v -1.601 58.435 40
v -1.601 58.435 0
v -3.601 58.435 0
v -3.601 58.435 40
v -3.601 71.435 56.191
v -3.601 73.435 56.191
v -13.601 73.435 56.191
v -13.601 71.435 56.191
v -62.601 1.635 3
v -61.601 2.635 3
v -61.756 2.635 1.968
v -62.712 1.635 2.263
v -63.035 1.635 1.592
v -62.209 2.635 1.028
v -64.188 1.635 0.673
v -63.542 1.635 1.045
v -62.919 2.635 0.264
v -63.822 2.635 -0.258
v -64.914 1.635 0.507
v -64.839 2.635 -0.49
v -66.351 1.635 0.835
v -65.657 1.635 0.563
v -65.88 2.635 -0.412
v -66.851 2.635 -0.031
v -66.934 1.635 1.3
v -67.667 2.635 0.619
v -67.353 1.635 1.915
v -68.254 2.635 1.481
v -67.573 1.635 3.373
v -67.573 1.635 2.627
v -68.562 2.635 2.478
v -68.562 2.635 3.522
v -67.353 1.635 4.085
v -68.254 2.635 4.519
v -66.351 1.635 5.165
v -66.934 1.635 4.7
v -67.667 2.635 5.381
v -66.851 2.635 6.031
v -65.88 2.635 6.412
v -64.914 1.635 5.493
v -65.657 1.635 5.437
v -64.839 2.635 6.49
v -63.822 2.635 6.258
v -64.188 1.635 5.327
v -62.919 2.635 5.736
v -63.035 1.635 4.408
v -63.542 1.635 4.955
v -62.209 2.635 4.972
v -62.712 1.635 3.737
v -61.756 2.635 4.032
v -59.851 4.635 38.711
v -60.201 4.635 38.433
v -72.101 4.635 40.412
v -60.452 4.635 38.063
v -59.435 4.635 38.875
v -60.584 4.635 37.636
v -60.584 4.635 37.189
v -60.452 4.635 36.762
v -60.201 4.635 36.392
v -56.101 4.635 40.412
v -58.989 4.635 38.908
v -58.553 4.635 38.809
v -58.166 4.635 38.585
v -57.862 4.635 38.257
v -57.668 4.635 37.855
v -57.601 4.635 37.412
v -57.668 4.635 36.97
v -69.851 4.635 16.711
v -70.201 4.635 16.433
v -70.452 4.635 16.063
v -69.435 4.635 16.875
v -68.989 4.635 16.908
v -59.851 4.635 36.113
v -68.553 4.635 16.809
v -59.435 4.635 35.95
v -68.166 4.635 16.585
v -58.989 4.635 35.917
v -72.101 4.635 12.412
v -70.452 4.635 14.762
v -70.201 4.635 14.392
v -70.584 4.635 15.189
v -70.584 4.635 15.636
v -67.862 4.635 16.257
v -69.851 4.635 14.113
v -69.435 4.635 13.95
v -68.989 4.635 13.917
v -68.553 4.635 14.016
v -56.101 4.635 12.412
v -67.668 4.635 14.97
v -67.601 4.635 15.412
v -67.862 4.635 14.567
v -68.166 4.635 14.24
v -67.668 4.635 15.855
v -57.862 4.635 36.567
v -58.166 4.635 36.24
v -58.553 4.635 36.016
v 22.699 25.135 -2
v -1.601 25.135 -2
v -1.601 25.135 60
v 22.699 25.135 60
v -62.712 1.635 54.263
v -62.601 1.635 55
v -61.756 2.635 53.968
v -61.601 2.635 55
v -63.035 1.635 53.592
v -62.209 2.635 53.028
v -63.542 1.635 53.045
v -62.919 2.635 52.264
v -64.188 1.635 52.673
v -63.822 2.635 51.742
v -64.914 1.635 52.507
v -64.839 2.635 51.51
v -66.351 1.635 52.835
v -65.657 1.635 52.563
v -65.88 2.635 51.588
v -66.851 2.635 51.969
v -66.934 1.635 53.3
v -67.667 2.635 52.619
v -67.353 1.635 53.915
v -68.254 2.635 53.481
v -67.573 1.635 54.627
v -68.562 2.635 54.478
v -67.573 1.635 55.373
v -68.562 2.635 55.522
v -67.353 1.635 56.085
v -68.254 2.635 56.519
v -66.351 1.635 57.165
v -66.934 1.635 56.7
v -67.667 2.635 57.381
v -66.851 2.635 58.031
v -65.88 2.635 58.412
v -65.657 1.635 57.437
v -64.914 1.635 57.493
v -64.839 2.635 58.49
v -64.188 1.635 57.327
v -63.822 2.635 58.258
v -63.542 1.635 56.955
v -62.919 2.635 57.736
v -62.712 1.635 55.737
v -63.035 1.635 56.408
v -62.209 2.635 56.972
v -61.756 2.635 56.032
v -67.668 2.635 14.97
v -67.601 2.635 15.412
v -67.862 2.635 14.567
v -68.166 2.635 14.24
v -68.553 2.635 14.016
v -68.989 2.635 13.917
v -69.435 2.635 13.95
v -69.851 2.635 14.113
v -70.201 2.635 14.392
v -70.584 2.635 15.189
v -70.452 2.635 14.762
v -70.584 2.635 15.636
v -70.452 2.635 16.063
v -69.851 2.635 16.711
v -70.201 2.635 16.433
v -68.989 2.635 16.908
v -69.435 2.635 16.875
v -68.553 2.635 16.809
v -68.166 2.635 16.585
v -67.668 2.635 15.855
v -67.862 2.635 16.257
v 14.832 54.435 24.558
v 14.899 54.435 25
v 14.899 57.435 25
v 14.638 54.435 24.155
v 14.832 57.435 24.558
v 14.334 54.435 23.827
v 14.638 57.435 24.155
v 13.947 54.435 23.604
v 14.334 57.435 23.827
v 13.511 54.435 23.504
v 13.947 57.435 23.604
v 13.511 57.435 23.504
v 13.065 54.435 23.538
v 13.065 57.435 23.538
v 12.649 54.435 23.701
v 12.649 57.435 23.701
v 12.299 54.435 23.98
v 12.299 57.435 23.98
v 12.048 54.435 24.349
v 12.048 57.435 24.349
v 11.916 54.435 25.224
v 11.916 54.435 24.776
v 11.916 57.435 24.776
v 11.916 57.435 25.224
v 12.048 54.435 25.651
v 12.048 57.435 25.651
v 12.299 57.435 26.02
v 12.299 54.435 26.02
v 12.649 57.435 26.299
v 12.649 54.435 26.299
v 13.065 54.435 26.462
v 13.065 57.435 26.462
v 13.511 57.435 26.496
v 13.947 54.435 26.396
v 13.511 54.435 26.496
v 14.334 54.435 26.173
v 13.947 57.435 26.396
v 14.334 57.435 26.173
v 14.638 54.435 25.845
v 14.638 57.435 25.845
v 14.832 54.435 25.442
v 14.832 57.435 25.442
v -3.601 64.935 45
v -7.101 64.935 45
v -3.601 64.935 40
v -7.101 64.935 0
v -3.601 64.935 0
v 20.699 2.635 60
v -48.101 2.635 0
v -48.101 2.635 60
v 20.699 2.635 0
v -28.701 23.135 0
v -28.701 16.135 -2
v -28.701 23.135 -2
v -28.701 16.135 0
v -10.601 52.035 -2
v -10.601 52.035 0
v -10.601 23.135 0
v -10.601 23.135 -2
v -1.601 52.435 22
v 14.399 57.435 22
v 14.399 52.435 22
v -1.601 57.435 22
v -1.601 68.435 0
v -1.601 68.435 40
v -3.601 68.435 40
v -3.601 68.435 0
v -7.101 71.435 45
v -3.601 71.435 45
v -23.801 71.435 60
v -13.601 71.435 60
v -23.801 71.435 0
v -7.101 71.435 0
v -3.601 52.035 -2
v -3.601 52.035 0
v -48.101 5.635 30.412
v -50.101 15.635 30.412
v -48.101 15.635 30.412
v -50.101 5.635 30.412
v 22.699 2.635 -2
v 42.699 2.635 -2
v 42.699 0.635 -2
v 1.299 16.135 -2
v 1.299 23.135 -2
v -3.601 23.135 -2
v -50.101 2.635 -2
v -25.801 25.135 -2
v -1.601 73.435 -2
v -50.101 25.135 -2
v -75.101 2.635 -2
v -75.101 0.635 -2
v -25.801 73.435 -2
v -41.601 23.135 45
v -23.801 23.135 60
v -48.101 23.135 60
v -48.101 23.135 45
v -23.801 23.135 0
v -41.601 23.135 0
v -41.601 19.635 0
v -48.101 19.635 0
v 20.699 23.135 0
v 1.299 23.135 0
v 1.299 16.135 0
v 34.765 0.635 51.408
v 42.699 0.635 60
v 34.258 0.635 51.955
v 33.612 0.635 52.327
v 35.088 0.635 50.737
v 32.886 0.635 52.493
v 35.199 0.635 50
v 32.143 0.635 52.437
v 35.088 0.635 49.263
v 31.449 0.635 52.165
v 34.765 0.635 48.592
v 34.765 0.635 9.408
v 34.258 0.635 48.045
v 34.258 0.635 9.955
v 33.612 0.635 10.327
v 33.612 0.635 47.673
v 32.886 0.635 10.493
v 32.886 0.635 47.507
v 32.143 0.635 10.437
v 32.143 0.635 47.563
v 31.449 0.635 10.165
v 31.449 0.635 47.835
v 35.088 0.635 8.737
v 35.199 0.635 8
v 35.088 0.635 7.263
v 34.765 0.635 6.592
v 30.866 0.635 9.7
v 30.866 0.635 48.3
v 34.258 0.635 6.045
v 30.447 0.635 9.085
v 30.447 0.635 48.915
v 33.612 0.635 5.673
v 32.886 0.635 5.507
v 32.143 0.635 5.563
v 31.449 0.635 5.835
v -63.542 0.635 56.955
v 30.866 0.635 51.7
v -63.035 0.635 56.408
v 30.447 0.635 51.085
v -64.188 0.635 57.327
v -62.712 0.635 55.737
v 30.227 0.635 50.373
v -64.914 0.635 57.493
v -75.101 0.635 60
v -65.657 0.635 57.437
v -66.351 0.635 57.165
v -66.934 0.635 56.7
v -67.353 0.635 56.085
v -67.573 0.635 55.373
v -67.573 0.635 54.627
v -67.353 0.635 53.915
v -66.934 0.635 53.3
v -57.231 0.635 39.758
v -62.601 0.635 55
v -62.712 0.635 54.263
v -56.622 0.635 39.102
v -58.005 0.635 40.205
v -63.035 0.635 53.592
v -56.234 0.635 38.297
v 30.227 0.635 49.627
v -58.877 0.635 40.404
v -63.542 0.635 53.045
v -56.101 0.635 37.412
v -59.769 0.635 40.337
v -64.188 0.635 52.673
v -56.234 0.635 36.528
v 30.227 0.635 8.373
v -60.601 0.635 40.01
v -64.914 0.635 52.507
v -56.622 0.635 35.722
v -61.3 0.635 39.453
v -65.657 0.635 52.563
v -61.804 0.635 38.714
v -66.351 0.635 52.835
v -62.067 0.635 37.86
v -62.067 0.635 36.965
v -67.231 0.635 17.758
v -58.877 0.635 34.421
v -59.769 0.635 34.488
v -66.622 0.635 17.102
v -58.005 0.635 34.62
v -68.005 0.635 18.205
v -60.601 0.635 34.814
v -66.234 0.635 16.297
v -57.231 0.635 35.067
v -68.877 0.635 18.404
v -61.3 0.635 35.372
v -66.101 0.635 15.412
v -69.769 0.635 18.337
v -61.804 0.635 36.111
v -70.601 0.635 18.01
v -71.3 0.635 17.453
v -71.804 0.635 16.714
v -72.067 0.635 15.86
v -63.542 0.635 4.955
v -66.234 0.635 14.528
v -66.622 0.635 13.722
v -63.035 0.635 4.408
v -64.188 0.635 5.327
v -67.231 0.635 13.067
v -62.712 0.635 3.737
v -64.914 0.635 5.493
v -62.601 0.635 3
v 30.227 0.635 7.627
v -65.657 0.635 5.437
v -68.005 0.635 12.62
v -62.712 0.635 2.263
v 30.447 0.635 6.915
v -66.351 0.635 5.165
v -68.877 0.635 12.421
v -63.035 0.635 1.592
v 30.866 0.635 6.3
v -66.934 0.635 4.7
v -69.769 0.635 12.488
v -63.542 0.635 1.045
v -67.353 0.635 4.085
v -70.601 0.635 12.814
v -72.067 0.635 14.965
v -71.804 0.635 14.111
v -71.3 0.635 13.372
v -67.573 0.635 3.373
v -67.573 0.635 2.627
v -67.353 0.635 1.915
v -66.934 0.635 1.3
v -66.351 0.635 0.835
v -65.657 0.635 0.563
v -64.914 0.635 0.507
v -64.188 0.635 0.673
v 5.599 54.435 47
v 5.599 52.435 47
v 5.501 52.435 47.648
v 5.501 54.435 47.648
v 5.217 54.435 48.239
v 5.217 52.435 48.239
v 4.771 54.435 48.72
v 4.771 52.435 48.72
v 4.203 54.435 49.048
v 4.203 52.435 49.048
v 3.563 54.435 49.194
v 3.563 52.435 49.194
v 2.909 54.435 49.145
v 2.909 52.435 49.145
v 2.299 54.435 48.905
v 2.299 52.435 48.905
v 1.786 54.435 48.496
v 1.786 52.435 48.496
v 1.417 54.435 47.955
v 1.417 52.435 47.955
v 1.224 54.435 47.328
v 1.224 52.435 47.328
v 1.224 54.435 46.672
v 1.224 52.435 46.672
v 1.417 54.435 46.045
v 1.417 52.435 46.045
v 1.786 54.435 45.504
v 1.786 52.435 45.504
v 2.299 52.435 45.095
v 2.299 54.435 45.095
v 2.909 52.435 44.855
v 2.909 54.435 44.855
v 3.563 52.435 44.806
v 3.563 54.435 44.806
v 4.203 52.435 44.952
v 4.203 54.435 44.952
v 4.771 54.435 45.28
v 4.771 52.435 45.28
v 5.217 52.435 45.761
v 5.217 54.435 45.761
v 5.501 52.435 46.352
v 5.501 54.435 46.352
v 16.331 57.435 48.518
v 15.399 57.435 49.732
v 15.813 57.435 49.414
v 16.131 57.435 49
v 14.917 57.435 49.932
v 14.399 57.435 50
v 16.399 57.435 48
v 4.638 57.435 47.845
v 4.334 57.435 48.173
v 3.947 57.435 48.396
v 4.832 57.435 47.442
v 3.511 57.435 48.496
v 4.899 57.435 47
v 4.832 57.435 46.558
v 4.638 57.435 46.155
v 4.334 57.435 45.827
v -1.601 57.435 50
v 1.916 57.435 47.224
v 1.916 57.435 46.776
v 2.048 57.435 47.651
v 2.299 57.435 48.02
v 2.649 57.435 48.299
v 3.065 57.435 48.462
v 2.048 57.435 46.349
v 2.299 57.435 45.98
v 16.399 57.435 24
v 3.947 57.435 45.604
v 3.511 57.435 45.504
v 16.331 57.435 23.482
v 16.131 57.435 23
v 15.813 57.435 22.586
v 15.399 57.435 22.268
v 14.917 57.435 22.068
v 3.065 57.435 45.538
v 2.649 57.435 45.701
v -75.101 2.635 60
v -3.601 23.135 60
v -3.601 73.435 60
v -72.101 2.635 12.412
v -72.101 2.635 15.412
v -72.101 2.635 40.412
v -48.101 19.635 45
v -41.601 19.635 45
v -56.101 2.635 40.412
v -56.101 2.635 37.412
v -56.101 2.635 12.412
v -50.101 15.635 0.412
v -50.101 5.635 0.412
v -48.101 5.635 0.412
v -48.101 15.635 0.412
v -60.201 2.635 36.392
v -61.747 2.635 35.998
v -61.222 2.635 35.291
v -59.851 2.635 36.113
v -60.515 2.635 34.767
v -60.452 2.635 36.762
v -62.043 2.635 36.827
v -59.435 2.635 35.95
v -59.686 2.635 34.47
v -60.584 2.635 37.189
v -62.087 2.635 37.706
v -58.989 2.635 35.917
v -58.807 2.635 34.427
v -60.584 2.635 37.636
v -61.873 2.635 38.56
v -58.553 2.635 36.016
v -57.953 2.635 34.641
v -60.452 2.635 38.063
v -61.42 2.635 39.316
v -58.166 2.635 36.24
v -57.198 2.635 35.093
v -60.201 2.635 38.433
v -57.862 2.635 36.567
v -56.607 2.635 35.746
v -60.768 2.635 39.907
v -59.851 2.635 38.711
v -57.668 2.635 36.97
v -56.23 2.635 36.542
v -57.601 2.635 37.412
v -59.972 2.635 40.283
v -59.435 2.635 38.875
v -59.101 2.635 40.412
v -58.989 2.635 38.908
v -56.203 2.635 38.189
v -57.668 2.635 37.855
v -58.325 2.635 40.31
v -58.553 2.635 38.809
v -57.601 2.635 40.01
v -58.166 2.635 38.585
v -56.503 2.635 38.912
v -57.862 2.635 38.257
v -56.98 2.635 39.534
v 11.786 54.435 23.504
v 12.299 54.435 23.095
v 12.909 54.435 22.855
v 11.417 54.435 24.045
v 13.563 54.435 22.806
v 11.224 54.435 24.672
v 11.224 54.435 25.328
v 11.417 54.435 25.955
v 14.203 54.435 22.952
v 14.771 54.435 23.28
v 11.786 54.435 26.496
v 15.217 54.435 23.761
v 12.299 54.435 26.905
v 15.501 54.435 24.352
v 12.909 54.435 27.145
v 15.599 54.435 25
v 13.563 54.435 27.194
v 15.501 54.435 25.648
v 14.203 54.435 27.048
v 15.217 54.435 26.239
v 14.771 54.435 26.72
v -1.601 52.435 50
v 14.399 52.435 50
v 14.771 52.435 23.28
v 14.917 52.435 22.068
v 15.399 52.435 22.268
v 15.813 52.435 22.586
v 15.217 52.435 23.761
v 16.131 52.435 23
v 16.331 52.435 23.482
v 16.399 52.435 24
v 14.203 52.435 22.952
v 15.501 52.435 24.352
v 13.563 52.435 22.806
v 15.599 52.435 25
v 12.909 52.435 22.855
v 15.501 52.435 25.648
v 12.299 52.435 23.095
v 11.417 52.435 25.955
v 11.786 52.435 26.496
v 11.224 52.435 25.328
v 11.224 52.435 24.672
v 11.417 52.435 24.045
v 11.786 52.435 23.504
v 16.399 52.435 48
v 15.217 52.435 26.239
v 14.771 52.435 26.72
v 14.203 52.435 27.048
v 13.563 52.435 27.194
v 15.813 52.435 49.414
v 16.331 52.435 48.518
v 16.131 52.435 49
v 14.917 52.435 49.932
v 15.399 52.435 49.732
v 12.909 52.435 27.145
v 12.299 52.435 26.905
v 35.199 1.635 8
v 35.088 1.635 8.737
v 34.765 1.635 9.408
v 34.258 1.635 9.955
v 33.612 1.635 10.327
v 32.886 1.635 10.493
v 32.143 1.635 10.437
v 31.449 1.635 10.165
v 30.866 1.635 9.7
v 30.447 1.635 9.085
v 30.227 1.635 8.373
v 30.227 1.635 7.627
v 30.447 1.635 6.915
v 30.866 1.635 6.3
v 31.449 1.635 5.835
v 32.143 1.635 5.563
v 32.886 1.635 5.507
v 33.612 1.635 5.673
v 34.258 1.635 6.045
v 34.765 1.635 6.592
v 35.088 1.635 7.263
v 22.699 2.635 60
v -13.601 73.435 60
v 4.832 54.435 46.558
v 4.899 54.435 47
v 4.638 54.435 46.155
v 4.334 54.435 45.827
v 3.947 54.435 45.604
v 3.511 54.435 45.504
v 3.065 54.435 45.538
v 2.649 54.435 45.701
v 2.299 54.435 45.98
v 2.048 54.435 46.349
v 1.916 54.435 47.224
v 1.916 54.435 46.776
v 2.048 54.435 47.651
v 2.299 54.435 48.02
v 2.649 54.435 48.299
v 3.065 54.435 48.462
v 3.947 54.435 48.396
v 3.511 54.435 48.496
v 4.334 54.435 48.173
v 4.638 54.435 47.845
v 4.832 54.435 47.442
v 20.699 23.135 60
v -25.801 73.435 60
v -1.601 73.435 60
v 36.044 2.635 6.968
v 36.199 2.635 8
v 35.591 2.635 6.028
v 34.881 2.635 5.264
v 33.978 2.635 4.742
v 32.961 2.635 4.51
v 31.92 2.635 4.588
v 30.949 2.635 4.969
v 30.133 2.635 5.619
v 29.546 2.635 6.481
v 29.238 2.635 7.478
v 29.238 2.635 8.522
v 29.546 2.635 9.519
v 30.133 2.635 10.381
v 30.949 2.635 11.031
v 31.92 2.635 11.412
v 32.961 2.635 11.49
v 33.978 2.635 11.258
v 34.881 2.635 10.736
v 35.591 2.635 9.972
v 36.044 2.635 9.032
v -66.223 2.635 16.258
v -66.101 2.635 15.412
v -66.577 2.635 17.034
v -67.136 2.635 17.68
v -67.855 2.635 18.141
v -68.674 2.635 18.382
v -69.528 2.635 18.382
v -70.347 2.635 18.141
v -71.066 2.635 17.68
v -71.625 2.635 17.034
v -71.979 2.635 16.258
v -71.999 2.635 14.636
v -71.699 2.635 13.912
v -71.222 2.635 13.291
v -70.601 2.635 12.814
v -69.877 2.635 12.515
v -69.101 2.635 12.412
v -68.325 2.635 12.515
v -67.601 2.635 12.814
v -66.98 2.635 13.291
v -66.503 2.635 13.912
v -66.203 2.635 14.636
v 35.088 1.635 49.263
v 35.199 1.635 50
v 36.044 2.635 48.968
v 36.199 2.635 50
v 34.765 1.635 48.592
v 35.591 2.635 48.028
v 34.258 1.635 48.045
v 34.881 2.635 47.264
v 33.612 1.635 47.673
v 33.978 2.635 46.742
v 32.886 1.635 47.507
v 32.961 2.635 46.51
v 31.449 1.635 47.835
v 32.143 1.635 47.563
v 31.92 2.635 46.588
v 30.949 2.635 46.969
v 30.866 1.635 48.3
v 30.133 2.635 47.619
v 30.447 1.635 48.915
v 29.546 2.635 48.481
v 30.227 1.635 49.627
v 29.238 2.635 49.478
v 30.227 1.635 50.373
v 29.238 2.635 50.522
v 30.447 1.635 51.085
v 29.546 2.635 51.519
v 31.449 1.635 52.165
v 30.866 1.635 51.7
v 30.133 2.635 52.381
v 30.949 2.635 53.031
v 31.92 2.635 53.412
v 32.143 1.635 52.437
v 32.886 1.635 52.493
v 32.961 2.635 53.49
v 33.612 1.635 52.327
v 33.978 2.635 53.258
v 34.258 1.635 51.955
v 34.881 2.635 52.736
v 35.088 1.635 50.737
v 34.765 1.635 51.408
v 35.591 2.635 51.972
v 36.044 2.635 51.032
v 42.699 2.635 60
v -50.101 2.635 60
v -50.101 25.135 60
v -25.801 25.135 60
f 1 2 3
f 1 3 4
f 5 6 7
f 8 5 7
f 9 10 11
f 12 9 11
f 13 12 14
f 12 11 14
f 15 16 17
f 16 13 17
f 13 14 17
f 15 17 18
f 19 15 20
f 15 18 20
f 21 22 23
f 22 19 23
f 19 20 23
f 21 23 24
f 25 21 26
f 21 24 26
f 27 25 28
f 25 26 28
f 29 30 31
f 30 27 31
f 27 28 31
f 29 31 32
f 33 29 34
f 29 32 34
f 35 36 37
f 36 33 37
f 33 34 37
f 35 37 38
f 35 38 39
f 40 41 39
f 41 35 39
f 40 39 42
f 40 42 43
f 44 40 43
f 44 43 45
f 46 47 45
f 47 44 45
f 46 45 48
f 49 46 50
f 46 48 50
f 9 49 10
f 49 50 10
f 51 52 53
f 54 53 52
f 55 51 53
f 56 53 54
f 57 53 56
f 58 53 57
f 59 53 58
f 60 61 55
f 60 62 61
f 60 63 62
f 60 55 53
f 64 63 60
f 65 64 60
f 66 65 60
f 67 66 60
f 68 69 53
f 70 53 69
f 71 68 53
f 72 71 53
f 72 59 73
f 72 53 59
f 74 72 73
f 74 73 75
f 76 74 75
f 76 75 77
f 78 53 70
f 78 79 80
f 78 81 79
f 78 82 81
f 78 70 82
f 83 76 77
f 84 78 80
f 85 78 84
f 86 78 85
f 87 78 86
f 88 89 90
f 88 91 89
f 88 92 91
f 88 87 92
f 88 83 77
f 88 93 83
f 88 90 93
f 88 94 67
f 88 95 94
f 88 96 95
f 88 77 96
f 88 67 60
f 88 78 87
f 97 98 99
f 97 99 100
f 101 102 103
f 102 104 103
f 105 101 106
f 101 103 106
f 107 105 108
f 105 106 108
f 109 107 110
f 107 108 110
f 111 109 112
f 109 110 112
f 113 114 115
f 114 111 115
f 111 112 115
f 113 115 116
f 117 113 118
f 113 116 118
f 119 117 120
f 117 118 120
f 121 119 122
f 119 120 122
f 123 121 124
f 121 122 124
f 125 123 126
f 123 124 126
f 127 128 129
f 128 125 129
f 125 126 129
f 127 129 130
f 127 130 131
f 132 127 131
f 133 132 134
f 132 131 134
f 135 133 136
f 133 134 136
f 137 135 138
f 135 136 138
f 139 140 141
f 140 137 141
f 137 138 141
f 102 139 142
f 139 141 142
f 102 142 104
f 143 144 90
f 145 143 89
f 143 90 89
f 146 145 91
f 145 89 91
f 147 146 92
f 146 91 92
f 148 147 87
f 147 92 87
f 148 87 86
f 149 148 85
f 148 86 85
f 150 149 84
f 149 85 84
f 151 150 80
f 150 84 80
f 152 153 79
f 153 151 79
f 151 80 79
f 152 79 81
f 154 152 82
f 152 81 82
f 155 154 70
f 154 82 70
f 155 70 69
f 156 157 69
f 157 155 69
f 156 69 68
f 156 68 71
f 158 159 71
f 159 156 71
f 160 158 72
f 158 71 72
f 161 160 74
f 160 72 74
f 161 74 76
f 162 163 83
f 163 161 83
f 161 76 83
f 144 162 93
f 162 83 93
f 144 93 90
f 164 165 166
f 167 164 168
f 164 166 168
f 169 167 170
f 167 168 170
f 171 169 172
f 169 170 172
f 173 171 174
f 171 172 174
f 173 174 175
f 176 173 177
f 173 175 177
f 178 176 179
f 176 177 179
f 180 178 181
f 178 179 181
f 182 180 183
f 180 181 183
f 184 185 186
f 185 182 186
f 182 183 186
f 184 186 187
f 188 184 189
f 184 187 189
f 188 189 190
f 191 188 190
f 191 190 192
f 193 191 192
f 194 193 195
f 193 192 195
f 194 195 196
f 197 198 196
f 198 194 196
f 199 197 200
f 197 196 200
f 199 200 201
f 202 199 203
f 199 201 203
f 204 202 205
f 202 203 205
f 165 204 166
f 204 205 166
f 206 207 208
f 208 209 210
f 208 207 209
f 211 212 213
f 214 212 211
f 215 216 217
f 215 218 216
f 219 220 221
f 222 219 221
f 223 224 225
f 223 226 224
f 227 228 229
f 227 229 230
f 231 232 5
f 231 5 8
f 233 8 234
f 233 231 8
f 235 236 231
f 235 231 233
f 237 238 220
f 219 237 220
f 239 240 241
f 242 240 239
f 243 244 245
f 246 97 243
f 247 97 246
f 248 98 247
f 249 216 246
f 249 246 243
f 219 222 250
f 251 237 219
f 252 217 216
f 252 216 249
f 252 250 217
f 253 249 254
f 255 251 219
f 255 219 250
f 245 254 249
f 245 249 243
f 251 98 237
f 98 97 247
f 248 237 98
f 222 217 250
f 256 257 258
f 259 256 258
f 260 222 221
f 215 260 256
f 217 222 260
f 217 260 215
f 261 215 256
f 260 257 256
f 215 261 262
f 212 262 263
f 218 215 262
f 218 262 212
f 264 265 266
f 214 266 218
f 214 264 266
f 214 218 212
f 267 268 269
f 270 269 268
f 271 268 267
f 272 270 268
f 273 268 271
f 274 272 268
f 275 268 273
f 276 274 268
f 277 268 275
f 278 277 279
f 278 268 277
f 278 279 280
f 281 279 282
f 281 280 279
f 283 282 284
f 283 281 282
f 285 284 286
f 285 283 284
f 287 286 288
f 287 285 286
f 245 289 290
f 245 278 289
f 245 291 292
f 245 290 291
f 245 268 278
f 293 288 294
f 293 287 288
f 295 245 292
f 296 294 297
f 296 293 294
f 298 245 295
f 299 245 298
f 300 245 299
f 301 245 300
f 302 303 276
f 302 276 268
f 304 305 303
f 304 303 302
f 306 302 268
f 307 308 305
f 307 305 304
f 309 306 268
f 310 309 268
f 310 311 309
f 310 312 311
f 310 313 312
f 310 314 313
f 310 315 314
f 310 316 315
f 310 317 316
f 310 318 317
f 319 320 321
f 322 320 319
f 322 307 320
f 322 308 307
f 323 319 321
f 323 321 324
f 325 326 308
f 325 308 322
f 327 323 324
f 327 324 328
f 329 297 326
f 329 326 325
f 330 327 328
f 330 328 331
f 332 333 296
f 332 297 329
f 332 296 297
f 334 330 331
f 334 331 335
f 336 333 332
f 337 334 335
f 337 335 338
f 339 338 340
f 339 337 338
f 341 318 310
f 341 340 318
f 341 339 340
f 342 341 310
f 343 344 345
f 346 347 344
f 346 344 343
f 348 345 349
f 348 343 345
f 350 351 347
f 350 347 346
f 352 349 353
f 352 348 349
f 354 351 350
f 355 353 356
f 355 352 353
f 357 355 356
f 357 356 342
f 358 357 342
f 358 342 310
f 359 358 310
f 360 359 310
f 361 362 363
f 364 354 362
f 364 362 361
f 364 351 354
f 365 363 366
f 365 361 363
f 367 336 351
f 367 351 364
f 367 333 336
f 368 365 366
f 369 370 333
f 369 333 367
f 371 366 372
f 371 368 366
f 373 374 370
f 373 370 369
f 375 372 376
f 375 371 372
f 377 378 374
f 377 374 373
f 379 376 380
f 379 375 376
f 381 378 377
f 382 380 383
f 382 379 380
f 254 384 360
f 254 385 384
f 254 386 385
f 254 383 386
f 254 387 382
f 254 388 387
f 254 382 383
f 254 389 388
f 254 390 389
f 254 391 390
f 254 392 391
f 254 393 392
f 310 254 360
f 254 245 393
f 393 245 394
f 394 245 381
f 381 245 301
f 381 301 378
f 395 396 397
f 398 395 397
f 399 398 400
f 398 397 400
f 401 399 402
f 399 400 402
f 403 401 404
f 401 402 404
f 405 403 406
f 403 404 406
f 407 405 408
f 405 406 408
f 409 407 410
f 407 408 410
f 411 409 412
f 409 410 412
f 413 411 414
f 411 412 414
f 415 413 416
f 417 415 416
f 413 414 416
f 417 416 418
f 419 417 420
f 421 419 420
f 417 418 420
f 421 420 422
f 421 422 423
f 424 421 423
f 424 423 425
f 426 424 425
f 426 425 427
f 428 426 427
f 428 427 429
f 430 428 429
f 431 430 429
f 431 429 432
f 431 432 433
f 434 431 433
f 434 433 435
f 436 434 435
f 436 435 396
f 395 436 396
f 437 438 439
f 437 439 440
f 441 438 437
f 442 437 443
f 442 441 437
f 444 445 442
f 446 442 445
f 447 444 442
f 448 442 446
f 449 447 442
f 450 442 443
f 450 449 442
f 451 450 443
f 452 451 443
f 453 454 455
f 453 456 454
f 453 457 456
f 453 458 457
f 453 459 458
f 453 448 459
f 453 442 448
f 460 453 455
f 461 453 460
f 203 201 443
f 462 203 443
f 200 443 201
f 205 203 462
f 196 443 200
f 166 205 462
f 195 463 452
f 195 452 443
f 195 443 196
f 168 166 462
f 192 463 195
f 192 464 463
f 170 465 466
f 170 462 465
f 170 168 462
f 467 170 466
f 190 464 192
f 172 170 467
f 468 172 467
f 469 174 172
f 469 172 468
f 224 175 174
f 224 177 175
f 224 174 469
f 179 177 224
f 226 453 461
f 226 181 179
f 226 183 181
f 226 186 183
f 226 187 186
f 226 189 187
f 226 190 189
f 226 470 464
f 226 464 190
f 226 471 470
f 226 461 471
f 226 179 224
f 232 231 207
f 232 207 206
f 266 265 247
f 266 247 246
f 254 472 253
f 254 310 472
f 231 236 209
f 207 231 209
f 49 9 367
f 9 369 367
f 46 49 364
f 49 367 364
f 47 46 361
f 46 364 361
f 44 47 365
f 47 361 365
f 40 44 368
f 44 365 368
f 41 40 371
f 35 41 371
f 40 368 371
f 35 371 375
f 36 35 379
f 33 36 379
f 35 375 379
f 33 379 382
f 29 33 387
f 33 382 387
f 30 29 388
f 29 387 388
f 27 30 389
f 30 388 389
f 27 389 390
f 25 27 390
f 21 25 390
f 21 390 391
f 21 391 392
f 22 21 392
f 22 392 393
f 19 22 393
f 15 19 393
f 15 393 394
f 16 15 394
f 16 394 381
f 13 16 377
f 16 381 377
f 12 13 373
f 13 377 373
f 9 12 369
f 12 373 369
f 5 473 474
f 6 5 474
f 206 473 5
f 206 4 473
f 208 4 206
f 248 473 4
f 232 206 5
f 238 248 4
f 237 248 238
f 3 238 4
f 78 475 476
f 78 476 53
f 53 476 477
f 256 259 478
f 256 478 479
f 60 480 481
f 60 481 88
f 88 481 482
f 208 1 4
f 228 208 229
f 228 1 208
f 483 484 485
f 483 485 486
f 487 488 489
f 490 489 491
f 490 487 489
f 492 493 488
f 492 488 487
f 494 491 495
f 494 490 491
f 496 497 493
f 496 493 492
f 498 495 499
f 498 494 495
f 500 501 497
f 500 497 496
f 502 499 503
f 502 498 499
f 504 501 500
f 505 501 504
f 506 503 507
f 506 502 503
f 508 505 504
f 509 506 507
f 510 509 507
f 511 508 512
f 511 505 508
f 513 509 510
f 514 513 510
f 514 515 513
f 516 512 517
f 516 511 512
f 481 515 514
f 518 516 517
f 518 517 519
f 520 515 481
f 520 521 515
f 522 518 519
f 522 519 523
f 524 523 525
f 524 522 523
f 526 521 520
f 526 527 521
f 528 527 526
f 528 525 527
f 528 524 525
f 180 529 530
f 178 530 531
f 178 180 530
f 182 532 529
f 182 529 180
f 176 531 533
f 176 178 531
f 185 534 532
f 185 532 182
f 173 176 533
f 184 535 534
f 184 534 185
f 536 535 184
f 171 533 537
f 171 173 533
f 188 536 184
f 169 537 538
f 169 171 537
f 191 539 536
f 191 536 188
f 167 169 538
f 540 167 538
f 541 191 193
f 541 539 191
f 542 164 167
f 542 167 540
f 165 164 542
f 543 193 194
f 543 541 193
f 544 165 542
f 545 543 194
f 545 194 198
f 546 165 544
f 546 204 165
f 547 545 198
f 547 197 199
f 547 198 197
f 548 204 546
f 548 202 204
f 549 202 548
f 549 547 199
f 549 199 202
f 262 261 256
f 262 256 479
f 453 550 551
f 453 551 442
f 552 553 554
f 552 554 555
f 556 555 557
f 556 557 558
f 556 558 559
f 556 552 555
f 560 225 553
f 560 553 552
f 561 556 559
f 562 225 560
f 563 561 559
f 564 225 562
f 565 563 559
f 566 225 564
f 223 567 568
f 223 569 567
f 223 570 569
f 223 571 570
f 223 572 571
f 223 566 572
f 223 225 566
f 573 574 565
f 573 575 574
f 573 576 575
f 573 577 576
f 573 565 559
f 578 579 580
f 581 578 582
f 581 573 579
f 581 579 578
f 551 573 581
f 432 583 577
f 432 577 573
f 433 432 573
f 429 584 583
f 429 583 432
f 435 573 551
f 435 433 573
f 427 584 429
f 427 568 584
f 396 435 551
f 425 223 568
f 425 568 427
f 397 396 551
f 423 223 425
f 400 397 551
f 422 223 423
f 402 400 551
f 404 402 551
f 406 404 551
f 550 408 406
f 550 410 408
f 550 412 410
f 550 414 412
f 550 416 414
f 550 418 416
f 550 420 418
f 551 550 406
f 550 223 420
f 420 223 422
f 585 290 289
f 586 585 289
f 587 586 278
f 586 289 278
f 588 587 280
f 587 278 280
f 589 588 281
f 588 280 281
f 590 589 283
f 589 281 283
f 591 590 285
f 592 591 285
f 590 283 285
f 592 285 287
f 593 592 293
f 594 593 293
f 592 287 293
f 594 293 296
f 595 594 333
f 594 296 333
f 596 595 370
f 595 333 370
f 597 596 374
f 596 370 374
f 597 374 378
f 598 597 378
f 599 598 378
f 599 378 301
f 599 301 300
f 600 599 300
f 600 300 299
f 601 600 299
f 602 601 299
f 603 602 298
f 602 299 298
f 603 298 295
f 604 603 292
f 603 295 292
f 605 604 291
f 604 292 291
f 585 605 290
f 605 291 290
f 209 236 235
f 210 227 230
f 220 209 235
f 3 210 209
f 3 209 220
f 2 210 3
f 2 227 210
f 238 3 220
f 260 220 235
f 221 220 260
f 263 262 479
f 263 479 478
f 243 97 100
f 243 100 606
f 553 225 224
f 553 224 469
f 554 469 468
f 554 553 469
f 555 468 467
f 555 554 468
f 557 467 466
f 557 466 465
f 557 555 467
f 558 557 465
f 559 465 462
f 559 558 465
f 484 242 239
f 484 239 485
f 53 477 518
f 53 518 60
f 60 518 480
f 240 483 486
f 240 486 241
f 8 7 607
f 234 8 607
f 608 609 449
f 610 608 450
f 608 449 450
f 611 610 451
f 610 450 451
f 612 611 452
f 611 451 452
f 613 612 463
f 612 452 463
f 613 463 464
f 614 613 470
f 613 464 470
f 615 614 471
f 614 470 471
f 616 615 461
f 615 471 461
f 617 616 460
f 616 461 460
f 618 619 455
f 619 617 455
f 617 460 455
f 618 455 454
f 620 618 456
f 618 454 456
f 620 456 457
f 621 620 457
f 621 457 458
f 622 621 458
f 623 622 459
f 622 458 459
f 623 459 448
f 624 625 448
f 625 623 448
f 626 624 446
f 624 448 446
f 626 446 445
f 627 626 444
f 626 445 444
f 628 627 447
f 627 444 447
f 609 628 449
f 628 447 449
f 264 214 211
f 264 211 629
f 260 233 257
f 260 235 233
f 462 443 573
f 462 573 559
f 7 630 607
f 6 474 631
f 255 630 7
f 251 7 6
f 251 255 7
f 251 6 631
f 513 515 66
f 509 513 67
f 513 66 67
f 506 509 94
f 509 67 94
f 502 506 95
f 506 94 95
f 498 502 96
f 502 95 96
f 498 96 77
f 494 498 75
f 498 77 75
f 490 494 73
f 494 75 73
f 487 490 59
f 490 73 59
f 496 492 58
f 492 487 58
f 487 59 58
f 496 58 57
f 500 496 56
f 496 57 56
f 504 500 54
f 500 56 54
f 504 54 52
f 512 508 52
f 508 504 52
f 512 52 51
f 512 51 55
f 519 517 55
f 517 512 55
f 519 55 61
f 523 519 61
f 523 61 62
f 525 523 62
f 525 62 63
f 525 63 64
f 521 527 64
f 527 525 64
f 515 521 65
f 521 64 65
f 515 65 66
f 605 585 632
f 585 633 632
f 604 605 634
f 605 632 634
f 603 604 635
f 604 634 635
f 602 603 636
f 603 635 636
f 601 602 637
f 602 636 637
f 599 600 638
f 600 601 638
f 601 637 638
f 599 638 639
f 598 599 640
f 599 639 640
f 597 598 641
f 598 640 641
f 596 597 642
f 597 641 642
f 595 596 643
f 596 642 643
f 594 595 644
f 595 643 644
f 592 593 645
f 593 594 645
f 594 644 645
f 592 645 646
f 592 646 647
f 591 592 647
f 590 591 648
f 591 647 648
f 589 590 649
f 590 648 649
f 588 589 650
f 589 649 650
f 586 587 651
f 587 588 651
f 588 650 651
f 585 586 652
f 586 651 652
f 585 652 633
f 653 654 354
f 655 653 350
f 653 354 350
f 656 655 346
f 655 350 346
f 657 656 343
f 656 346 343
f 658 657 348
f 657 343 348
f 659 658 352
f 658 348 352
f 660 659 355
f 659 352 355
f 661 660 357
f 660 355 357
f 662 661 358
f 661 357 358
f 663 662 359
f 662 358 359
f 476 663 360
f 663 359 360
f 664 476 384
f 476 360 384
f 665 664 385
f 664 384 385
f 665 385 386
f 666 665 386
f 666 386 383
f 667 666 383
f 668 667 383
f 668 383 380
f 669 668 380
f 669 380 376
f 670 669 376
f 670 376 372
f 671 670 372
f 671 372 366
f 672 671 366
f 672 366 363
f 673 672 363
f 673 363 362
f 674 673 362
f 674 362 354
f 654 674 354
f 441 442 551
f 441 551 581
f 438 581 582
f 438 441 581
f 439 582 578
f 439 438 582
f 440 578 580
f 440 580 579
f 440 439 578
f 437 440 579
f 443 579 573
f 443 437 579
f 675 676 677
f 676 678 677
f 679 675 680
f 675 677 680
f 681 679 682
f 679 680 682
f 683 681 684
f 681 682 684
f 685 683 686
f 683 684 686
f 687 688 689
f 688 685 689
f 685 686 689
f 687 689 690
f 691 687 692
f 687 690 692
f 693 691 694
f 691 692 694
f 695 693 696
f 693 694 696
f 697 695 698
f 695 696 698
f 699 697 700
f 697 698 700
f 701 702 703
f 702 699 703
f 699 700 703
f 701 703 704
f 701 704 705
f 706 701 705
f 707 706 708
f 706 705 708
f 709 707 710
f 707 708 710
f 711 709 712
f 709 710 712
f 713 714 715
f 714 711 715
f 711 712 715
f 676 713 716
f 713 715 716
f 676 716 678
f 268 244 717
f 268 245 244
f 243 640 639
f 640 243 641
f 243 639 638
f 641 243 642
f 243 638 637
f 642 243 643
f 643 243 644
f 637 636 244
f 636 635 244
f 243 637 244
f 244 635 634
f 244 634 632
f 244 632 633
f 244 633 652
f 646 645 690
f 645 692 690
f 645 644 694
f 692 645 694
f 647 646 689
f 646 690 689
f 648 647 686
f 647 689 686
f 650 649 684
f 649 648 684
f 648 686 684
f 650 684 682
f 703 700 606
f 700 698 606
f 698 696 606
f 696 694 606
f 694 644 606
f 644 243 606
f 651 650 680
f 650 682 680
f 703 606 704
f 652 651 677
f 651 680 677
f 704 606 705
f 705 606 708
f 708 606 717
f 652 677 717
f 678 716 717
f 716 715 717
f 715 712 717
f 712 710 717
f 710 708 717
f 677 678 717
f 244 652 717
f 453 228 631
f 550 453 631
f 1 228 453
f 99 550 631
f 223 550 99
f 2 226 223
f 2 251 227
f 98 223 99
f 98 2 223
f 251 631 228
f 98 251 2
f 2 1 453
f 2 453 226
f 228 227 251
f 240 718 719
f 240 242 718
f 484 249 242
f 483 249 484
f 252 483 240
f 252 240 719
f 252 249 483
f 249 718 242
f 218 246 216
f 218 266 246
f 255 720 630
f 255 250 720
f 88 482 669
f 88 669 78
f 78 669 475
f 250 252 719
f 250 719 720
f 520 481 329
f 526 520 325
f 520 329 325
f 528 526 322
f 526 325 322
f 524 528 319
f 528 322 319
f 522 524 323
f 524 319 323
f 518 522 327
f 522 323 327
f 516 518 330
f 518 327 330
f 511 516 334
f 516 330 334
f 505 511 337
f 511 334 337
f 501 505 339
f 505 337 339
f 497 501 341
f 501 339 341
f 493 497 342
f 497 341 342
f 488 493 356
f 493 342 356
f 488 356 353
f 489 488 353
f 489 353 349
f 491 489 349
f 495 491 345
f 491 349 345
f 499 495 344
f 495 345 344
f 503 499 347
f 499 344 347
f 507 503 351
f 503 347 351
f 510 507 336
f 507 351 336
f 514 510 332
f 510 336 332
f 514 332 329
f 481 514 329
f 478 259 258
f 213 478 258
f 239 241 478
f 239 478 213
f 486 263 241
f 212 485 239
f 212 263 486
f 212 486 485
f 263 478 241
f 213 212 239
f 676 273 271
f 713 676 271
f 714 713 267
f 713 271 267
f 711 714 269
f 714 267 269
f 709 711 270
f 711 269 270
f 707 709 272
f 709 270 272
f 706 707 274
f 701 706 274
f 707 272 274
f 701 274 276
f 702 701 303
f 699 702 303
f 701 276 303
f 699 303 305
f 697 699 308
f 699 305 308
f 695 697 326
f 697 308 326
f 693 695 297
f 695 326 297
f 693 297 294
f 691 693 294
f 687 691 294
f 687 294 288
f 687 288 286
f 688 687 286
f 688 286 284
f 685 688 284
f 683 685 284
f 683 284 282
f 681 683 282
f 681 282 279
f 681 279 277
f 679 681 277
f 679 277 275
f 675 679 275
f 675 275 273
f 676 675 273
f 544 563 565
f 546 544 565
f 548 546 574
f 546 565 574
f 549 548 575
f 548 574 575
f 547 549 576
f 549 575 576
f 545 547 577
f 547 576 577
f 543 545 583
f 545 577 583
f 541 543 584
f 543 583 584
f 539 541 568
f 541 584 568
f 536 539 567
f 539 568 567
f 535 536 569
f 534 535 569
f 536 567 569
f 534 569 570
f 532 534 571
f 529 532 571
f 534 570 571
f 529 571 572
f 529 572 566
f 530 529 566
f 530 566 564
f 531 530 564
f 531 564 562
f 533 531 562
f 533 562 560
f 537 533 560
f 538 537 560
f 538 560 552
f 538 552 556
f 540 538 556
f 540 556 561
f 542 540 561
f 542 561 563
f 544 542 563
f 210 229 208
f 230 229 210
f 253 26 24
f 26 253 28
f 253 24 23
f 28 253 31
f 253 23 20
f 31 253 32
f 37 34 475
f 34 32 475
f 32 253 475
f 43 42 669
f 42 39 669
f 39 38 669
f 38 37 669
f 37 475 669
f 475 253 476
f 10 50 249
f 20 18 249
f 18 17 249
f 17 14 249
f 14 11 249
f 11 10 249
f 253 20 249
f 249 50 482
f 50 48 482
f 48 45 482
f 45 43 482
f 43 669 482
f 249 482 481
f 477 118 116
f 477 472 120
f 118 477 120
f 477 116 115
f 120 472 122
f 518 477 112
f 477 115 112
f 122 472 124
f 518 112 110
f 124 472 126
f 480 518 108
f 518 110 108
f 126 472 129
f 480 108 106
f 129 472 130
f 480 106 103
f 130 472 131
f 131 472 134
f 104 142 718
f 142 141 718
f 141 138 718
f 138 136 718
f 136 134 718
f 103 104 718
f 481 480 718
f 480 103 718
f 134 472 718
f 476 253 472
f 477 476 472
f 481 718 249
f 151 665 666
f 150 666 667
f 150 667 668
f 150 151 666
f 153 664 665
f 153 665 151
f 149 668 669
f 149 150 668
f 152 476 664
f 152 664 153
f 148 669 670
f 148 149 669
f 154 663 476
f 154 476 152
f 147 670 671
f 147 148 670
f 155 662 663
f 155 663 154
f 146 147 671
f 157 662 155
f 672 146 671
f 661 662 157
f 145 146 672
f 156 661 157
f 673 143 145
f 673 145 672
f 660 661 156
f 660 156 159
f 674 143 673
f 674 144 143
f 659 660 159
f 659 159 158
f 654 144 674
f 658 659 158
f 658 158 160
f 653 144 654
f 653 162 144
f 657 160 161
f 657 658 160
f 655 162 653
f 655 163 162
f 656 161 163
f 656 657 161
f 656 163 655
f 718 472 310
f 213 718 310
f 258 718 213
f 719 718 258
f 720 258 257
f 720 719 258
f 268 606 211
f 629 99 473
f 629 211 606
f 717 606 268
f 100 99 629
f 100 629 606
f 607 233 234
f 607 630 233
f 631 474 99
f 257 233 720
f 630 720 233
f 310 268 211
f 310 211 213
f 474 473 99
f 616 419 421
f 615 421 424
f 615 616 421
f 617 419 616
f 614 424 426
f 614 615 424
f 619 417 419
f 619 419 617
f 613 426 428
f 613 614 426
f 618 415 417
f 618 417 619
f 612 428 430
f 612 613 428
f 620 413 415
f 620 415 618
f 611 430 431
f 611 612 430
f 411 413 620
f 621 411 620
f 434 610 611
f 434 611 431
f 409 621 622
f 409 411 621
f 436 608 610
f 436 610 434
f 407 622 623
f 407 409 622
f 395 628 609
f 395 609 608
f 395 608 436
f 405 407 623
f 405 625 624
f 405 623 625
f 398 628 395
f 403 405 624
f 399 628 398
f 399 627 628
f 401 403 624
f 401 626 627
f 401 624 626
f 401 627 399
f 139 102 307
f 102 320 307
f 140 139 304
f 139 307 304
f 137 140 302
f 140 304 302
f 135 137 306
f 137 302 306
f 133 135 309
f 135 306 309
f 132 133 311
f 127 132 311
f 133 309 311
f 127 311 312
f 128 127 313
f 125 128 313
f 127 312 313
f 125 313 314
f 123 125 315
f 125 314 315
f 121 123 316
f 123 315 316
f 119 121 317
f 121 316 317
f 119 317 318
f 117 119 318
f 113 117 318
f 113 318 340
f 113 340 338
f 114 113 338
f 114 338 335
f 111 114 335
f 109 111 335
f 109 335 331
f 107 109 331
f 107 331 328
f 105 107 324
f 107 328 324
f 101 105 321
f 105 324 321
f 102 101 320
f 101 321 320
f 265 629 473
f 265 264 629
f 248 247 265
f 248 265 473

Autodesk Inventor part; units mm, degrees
ref_plane "YZ Plane" through (0, 0, 0) normal (1, 0, 0) x (0, 1, 0)
ref_plane "XZ Plane" through (0, 0, 0) normal (0, 1, 0) x (-1, 0, 0)
ref_plane "XY Plane" through (0, 0, 0) normal (0, 0, 1) x (1, 0, 0)
sketch "Sketch1" plane through (0, 0, 0) normal (0, 0, 1) x (1, 0, 0)
  line L0 (-50.101, 0.6354) -> (-50.101, 25.1354)
  line L1 (-50.101, 25.1354) -> (-25.801, 25.1354)
  line L2 (-25.801, 25.1354) -> (-25.801, 73.4354)
  line L3 (-25.801, 73.4354) -> (-1.601, 73.4354)
  line L4 (-1.601, 73.4354) -> (-1.601, 25.1354)
  line L5 (-1.601, 25.1354) -> (22.699, 25.1354)
  line L6 (22.699, 25.1354) -> (22.699, 0.6354)
  line L7 (22.699, 0.6354) -> (-50.101, 0.6354)
  line L8 (-23.801, 71.4354) -> (-23.801, 23.1354)
  line L9 (-23.801, 23.1354) -> (-48.101, 23.1354)
  line L10 (-48.101, 23.1354) -> (-48.101, 2.6354)
  line L11 (-48.101, 2.6354) -> (20.699, 2.6354)
  line L12 (20.699, 2.6354) -> (20.699, 23.1354)
  line L13 (20.699, 23.1354) -> (-3.601, 23.1354)
  line L14 (-3.601, 23.1354) -> (-3.601, 71.4354)
  line L15 (-3.601, 71.4354) -> (-23.801, 71.4354)
  line L16 (-13.701, 71.4354) -> (-13.701, 50.8657) construction
  line L17 (-13.701, 2.6354) -> (-13.701, -4.6342) construction
  point P0 (0, 0)
  dimension "d1" = 20.2
  dimension "d2" = 2
  dimension "d3" = 20.5
  dimension "d4" = 68.8
  dimension "d6" = 68.8
extrude "Extrusion1" add sketch "Sketch1" along normal blind 60
sketch "Sketch2" plane through (0, 0, 0) normal (0, 0, -1) x (-1, 0, 0)
  line L0 (1.601, 73.4354) -> (1.601, 25.1354) projected
  line L1 (25.801, 73.4354) -> (1.601, 73.4354) projected
  line L2 (25.801, 25.1354) -> (25.801, 73.4354) projected
  line L3 (50.101, 25.1354) -> (25.801, 25.1354) projected
  line L4 (50.101, 0.6354) -> (50.101, 25.1354) projected
  line L5 (-22.699, 0.6354) -> (50.101, 0.6354) projected
  line L6 (-22.699, 25.1354) -> (-22.699, 0.6354) projected
  line L7 (1.601, 25.1354) -> (-22.699, 25.1354) projected
  point P0 (0, 0)
extrude "Extrusion2" add sketch "Sketch2" along normal blind 2
sketch "Sketch3" plane through (0, 0, 0) normal (0, 0, 1) x (1, 0, 0)
  line L0 (-3.601, 71.4354) -> (-7.101, 71.4354)
  line L1 (-7.101, 71.4354) -> (-7.101, 64.9354)
  line L2 (-7.101, 64.9354) -> (-3.601, 64.9354)
  line L3 (-3.601, 64.9354) -> (-3.601, 71.4354)
  line L4 (-48.101, 23.1354) -> (-41.601, 23.1354)
  line L5 (-41.601, 23.1354) -> (-41.601, 19.6354)
  line L6 (-41.601, 19.6354) -> (-48.101, 19.6354)
  line L7 (-48.101, 19.6354) -> (-48.101, 23.1354)
  point P0 (0, 0)
  dimension "d15" = 3.5
  dimension "d16" = 6.5
  dimension "d157" = 6.5
  dimension "d158" = 3.5
extrude "Extrusion3" add sketch "Sketch3" along normal blind 45
sketch "Sketch8" plane through (-25.801, 73.4354, 60) normal (0, 1, 0) x (1, 0, 0)
  line L0 (22.2, 60) -> (22.2, 0) projected
  line L1 (12.2, -0.1913) -> (22.2, -0.1913)
  line L2 (22.2, -0.1913) -> (22.2, 3.8087)
  line L3 (22.2, 3.8087) -> (12.2, 3.8087)
  line L4 (12.2, 3.8087) -> (12.2, -0.1913)
  point P0 (25.801, 60)
  dimension "d41" = 4
  dimension "d42" = 10
extrude "Extrusion8" cut sketch "Sketch8" against normal blind 2
sketch "Sketch14" plane through (-50.101, 0.6354, 60) normal (0, -1, 0) x (1, 0, 0)
  line L0 (0, 0) -> (-25, 0)
  line L1 (-25, 0) -> (-25, -62)
  line L2 (-25, -62) -> (0, -62)
  line L3 (0, -62) -> (0, 0)
  line L4 (0, -62) -> (0, 0) projected
  line L5 (0, -31) -> (-8.3028, -31) construction
  line L6 (-25, -31) -> (-20.8134, -31) construction
  circle A0 centre (-15, -5) radius 2.5
  line L7 (72.8, -62) -> (92.8, -62)
  line L8 (92.8, -62) -> (92.8, 0)
  line L9 (92.8, 0) -> (72.8, 0)
  line L10 (72.8, 0) -> (72.8, -62)
  line L11 (72.8, 0) -> (48.5, 0) projected
  circle A1 centre (82.8, -10) radius 2.5
  circle A2 centre (-15, -57) radius 2.5
  circle A3 centre (82.8, -52) radius 2.5
  point P0 (50.101, -60)
  dimension "d81" = 62
  dimension "d82" = 25
  dimension "d83" = 5
  dimension "d89" = 5
  dimension "d90" = 10
  dimension "d150" = 5
  dimension "d151" = 10
  dimension "d152" = 10
  dimension "d153" = 20
  dimension "d159" = 5
  dimension "d160" = 5
  dimension "d161" = 5
  dimension "d162" = 10
  dimension "d163" = 10
  dimension "d164" = 10
extrude "Extrusion14" add sketch "Sketch14" against normal blind 2
chamfer "Chamfer1" distance 1 angle 45 4 edges at (-67.601, 2.6354, 55) (-67.601, 2.6354, 3) (30.199, 2.6354, 8) (30.199, 2.6354, 50)
sketch "Sketch15" plane through (-50.101, 2.6354, 60) normal (0, 1, 0) x (1, 0, 0)
  line L0 (-6, 47.5876) -> (-22, 47.5876)
  line L1 (-22, 47.5876) -> (-22, 19.5876)
  line L2 (-22, 19.5876) -> (-6, 19.5876)
  line L3 (-6, 19.5876) -> (-6, 47.5876)
  line L4 (0, 0) -> (0, 62) projected
  point P0 (50.101, 60)
  dimension "d91" = 16
  dimension "d92" = 28
  dimension "d93" = 6
extrude "Extrusion15" add sketch "Sketch15" along normal blind 2
sketch "Sketch16" plane through (-50.101, 0.6354, 60) normal (-1, 0, 0) x (0, 0, 1)
  line L0 (-47.5876, 4) -> (-19.5876, 4) projected
  line L1 (-59.5876, 15) -> (-29.5876, 15)
  line L2 (-29.5876, 15) -> (-29.5876, 5)
  line L3 (-29.5876, 5) -> (-59.5876, 5)
  line L4 (-59.5876, 5) -> (-59.5876, 15)
  line L5 (-47.5876, 2) -> (-47.5876, 4) projected
  point P0 (-60, -0.6354)
  dimension "d96" = 18
  dimension "d97" = 30
  dimension "d99" = 1
  dimension "d100" = 10
extrude "Extrusion16" cut sketch "Sketch16" against normal blind 2
sketch "Sketch17" plane through (-50.101, 4.6354, 60) normal (0, 1, 0) x (1, 0, 0)
  circle A0 centre (-19, 44.5876) radius 1.5
  circle A1 centre (-9, 22.5876) radius 1.5
  line L0 (-22, 47.5876) -> (-22, 19.5876) projected
  line L1 (-6, 47.5876) -> (-22, 47.5876) projected
  line L2 (-22, 19.5876) -> (-6, 19.5876) projected
  line L3 (-6, 19.5876) -> (-6, 47.5876) projected
  point P0 (50.101, 60)
  dimension "d103" = 3
  dimension "d104" = 3
  dimension "d105" = 3
  dimension "d106" = 3
  dimension "d107" = 3
  dimension "d108" = 3
extrude "Extrusion17" cut sketch "Sketch17" against normal blind 4 contours A0 | A1
sketch "Sketch18" plane through (-50.101, 0.6354, 60) normal (0, -1, 0) x (1, 0, 0)
  circle A0 centre (-19, -44.5876) radius 3
  circle A1 centre (-9, -22.5876) radius 3
  circle A2 centre (-19, -44.5876) radius 1.5 projected
  circle A3 centre (-9, -22.5876) radius 1.5 projected
  point P0 (50.101, -60)
  dimension "d111" = 6
  dimension "d112" = 6
extrude "Extrusion18" cut sketch "Sketch18" against normal blind 2
sketch "Sketch19" plane through (-1.601, 25.1354, 60) normal (1, 0, 0) x (0, 0, -1)
  line L0 (10, 32.3) -> (38, 32.3)
  line L1 (38, 32.3) -> (38, 27.3)
  line L2 (38, 27.3) -> (10, 27.3)
  line L3 (10, 27.3) -> (10, 32.3)
  line L4 (0, 48.3) -> (62, 48.3) projected
  line L5 (0, 0) -> (0, 48.3) projected
  point P0 (60, -25.1354)
  dimension "d115" = 5
  dimension "d116" = 28
  dimension "d119" = 16
  dimension "d120" = 10
extrude "Extrusion19" add sketch "Sketch19" along normal blind 18
sketch "Sketch20" plane through (-1.601, 57.4354, 50) normal (0, 1, 0) x (1, 0, 0)
  circle A0 centre (15, 25) radius 1.5
  circle A1 centre (5, 3) radius 1.5
  line L0 (0, 28) -> (18, 28) projected
  line L1 (18, 28) -> (18, 0) projected
  line L2 (0, 0) -> (18, 0) projected
  line L3 (0, -10) -> (0, 52) projected
  point P0 (1.601, 50)
  dimension "d121" = 3
  dimension "d122" = 3
  dimension "d123" = 3
  dimension "d124" = 3
  dimension "d125" = 3
  dimension "d126" = 5
extrude "Extrusion20" cut sketch "Sketch20" against normal blind 10 contours A0 | A1
sketch "Sketch21" plane through (-1.601, 52.4354, 22) normal (0, -1, 0) x (1, 0, 0)
  circle A0 centre (5, 25) radius 2.2
  circle A1 centre (15, 3) radius 2.2
  circle A2 centre (15, 3) radius 1.5 projected
  circle A3 centre (5, 25) radius 1.5 projected
  point P0 (1.601, -22)
  dimension "d129" = 4.4
  dimension "d130" = 4.4
extrude "Extrusion21" cut sketch "Sketch21" against normal blind 2
fillet "Fillet4" radius 2 2 edges at (16.399, 54.9354, 50) (16.399, 54.9354, 22)
sketch "Sketch22" plane through (-1.601, 25.1354, 60) normal (1, 0, 0) x (0, 0, -1)
  line L0 (20, 43.3) -> (60, 43.3)
  line L1 (60, 43.3) -> (60, 33.3)
  line L2 (60, 33.3) -> (20, 33.3)
  line L3 (20, 33.3) -> (20, 43.3)
  line L4 (36, 32.3) -> (12, 32.3) projected
  line L5 (10, 32.3) -> (10, 27.3) projected
  point P0 (60, -25.1354)
  dimension "d134" = 1
  dimension "d135" = 10
  dimension "d136" = 40
  dimension "d137" = 10
extrude "Extrusion22" cut sketch "Sketch22" against normal blind 2
sketch "Sketch23" plane through (0, 0, 0) normal (0, 0, 1) x (1, 0, 0)
  line L0 (-48.101, 2.6354) -> (-48.101, 23.1354) projected
  line L1 (-3.601, 73.4354) -> (-3.601, 23.1354) projected
  line L2 (-10.601, 22.0354) -> (-3.601, 22.0354)
  line L3 (-3.601, 22.0354) -> (-3.601, 52.0354)
  line L4 (-3.601, 52.0354) -> (-10.601, 52.0354)
  line L5 (-10.601, 52.0354) -> (-10.601, 22.0354)
  line L6 (-28.701, 23.1354) -> (1.299, 23.1354)
  line L7 (1.299, 23.1354) -> (1.299, 16.1354)
  line L8 (1.299, 16.1354) -> (-28.701, 16.1354)
  line L9 (-28.701, 16.1354) -> (-28.701, 23.1354)
  line L10 (-3.601, 23.1354) -> (20.699, 23.1354) projected
  dimension "d147" = 30
  dimension "d149" = 7
  dimension "d154" = 30
  dimension "d155" = 7
  dimension "d156" = 19.4
extrude "Extrusion23" cut sketch "Sketch23" against normal blind 2
sketch "Sketch24" plane through (-75.101, 0.6354, -2) normal (0, -1, 0) x (1, 0, 0)
  point P0 (75.101, 2)
properties part number "Caja zapato ZOWI DER 2.1"
